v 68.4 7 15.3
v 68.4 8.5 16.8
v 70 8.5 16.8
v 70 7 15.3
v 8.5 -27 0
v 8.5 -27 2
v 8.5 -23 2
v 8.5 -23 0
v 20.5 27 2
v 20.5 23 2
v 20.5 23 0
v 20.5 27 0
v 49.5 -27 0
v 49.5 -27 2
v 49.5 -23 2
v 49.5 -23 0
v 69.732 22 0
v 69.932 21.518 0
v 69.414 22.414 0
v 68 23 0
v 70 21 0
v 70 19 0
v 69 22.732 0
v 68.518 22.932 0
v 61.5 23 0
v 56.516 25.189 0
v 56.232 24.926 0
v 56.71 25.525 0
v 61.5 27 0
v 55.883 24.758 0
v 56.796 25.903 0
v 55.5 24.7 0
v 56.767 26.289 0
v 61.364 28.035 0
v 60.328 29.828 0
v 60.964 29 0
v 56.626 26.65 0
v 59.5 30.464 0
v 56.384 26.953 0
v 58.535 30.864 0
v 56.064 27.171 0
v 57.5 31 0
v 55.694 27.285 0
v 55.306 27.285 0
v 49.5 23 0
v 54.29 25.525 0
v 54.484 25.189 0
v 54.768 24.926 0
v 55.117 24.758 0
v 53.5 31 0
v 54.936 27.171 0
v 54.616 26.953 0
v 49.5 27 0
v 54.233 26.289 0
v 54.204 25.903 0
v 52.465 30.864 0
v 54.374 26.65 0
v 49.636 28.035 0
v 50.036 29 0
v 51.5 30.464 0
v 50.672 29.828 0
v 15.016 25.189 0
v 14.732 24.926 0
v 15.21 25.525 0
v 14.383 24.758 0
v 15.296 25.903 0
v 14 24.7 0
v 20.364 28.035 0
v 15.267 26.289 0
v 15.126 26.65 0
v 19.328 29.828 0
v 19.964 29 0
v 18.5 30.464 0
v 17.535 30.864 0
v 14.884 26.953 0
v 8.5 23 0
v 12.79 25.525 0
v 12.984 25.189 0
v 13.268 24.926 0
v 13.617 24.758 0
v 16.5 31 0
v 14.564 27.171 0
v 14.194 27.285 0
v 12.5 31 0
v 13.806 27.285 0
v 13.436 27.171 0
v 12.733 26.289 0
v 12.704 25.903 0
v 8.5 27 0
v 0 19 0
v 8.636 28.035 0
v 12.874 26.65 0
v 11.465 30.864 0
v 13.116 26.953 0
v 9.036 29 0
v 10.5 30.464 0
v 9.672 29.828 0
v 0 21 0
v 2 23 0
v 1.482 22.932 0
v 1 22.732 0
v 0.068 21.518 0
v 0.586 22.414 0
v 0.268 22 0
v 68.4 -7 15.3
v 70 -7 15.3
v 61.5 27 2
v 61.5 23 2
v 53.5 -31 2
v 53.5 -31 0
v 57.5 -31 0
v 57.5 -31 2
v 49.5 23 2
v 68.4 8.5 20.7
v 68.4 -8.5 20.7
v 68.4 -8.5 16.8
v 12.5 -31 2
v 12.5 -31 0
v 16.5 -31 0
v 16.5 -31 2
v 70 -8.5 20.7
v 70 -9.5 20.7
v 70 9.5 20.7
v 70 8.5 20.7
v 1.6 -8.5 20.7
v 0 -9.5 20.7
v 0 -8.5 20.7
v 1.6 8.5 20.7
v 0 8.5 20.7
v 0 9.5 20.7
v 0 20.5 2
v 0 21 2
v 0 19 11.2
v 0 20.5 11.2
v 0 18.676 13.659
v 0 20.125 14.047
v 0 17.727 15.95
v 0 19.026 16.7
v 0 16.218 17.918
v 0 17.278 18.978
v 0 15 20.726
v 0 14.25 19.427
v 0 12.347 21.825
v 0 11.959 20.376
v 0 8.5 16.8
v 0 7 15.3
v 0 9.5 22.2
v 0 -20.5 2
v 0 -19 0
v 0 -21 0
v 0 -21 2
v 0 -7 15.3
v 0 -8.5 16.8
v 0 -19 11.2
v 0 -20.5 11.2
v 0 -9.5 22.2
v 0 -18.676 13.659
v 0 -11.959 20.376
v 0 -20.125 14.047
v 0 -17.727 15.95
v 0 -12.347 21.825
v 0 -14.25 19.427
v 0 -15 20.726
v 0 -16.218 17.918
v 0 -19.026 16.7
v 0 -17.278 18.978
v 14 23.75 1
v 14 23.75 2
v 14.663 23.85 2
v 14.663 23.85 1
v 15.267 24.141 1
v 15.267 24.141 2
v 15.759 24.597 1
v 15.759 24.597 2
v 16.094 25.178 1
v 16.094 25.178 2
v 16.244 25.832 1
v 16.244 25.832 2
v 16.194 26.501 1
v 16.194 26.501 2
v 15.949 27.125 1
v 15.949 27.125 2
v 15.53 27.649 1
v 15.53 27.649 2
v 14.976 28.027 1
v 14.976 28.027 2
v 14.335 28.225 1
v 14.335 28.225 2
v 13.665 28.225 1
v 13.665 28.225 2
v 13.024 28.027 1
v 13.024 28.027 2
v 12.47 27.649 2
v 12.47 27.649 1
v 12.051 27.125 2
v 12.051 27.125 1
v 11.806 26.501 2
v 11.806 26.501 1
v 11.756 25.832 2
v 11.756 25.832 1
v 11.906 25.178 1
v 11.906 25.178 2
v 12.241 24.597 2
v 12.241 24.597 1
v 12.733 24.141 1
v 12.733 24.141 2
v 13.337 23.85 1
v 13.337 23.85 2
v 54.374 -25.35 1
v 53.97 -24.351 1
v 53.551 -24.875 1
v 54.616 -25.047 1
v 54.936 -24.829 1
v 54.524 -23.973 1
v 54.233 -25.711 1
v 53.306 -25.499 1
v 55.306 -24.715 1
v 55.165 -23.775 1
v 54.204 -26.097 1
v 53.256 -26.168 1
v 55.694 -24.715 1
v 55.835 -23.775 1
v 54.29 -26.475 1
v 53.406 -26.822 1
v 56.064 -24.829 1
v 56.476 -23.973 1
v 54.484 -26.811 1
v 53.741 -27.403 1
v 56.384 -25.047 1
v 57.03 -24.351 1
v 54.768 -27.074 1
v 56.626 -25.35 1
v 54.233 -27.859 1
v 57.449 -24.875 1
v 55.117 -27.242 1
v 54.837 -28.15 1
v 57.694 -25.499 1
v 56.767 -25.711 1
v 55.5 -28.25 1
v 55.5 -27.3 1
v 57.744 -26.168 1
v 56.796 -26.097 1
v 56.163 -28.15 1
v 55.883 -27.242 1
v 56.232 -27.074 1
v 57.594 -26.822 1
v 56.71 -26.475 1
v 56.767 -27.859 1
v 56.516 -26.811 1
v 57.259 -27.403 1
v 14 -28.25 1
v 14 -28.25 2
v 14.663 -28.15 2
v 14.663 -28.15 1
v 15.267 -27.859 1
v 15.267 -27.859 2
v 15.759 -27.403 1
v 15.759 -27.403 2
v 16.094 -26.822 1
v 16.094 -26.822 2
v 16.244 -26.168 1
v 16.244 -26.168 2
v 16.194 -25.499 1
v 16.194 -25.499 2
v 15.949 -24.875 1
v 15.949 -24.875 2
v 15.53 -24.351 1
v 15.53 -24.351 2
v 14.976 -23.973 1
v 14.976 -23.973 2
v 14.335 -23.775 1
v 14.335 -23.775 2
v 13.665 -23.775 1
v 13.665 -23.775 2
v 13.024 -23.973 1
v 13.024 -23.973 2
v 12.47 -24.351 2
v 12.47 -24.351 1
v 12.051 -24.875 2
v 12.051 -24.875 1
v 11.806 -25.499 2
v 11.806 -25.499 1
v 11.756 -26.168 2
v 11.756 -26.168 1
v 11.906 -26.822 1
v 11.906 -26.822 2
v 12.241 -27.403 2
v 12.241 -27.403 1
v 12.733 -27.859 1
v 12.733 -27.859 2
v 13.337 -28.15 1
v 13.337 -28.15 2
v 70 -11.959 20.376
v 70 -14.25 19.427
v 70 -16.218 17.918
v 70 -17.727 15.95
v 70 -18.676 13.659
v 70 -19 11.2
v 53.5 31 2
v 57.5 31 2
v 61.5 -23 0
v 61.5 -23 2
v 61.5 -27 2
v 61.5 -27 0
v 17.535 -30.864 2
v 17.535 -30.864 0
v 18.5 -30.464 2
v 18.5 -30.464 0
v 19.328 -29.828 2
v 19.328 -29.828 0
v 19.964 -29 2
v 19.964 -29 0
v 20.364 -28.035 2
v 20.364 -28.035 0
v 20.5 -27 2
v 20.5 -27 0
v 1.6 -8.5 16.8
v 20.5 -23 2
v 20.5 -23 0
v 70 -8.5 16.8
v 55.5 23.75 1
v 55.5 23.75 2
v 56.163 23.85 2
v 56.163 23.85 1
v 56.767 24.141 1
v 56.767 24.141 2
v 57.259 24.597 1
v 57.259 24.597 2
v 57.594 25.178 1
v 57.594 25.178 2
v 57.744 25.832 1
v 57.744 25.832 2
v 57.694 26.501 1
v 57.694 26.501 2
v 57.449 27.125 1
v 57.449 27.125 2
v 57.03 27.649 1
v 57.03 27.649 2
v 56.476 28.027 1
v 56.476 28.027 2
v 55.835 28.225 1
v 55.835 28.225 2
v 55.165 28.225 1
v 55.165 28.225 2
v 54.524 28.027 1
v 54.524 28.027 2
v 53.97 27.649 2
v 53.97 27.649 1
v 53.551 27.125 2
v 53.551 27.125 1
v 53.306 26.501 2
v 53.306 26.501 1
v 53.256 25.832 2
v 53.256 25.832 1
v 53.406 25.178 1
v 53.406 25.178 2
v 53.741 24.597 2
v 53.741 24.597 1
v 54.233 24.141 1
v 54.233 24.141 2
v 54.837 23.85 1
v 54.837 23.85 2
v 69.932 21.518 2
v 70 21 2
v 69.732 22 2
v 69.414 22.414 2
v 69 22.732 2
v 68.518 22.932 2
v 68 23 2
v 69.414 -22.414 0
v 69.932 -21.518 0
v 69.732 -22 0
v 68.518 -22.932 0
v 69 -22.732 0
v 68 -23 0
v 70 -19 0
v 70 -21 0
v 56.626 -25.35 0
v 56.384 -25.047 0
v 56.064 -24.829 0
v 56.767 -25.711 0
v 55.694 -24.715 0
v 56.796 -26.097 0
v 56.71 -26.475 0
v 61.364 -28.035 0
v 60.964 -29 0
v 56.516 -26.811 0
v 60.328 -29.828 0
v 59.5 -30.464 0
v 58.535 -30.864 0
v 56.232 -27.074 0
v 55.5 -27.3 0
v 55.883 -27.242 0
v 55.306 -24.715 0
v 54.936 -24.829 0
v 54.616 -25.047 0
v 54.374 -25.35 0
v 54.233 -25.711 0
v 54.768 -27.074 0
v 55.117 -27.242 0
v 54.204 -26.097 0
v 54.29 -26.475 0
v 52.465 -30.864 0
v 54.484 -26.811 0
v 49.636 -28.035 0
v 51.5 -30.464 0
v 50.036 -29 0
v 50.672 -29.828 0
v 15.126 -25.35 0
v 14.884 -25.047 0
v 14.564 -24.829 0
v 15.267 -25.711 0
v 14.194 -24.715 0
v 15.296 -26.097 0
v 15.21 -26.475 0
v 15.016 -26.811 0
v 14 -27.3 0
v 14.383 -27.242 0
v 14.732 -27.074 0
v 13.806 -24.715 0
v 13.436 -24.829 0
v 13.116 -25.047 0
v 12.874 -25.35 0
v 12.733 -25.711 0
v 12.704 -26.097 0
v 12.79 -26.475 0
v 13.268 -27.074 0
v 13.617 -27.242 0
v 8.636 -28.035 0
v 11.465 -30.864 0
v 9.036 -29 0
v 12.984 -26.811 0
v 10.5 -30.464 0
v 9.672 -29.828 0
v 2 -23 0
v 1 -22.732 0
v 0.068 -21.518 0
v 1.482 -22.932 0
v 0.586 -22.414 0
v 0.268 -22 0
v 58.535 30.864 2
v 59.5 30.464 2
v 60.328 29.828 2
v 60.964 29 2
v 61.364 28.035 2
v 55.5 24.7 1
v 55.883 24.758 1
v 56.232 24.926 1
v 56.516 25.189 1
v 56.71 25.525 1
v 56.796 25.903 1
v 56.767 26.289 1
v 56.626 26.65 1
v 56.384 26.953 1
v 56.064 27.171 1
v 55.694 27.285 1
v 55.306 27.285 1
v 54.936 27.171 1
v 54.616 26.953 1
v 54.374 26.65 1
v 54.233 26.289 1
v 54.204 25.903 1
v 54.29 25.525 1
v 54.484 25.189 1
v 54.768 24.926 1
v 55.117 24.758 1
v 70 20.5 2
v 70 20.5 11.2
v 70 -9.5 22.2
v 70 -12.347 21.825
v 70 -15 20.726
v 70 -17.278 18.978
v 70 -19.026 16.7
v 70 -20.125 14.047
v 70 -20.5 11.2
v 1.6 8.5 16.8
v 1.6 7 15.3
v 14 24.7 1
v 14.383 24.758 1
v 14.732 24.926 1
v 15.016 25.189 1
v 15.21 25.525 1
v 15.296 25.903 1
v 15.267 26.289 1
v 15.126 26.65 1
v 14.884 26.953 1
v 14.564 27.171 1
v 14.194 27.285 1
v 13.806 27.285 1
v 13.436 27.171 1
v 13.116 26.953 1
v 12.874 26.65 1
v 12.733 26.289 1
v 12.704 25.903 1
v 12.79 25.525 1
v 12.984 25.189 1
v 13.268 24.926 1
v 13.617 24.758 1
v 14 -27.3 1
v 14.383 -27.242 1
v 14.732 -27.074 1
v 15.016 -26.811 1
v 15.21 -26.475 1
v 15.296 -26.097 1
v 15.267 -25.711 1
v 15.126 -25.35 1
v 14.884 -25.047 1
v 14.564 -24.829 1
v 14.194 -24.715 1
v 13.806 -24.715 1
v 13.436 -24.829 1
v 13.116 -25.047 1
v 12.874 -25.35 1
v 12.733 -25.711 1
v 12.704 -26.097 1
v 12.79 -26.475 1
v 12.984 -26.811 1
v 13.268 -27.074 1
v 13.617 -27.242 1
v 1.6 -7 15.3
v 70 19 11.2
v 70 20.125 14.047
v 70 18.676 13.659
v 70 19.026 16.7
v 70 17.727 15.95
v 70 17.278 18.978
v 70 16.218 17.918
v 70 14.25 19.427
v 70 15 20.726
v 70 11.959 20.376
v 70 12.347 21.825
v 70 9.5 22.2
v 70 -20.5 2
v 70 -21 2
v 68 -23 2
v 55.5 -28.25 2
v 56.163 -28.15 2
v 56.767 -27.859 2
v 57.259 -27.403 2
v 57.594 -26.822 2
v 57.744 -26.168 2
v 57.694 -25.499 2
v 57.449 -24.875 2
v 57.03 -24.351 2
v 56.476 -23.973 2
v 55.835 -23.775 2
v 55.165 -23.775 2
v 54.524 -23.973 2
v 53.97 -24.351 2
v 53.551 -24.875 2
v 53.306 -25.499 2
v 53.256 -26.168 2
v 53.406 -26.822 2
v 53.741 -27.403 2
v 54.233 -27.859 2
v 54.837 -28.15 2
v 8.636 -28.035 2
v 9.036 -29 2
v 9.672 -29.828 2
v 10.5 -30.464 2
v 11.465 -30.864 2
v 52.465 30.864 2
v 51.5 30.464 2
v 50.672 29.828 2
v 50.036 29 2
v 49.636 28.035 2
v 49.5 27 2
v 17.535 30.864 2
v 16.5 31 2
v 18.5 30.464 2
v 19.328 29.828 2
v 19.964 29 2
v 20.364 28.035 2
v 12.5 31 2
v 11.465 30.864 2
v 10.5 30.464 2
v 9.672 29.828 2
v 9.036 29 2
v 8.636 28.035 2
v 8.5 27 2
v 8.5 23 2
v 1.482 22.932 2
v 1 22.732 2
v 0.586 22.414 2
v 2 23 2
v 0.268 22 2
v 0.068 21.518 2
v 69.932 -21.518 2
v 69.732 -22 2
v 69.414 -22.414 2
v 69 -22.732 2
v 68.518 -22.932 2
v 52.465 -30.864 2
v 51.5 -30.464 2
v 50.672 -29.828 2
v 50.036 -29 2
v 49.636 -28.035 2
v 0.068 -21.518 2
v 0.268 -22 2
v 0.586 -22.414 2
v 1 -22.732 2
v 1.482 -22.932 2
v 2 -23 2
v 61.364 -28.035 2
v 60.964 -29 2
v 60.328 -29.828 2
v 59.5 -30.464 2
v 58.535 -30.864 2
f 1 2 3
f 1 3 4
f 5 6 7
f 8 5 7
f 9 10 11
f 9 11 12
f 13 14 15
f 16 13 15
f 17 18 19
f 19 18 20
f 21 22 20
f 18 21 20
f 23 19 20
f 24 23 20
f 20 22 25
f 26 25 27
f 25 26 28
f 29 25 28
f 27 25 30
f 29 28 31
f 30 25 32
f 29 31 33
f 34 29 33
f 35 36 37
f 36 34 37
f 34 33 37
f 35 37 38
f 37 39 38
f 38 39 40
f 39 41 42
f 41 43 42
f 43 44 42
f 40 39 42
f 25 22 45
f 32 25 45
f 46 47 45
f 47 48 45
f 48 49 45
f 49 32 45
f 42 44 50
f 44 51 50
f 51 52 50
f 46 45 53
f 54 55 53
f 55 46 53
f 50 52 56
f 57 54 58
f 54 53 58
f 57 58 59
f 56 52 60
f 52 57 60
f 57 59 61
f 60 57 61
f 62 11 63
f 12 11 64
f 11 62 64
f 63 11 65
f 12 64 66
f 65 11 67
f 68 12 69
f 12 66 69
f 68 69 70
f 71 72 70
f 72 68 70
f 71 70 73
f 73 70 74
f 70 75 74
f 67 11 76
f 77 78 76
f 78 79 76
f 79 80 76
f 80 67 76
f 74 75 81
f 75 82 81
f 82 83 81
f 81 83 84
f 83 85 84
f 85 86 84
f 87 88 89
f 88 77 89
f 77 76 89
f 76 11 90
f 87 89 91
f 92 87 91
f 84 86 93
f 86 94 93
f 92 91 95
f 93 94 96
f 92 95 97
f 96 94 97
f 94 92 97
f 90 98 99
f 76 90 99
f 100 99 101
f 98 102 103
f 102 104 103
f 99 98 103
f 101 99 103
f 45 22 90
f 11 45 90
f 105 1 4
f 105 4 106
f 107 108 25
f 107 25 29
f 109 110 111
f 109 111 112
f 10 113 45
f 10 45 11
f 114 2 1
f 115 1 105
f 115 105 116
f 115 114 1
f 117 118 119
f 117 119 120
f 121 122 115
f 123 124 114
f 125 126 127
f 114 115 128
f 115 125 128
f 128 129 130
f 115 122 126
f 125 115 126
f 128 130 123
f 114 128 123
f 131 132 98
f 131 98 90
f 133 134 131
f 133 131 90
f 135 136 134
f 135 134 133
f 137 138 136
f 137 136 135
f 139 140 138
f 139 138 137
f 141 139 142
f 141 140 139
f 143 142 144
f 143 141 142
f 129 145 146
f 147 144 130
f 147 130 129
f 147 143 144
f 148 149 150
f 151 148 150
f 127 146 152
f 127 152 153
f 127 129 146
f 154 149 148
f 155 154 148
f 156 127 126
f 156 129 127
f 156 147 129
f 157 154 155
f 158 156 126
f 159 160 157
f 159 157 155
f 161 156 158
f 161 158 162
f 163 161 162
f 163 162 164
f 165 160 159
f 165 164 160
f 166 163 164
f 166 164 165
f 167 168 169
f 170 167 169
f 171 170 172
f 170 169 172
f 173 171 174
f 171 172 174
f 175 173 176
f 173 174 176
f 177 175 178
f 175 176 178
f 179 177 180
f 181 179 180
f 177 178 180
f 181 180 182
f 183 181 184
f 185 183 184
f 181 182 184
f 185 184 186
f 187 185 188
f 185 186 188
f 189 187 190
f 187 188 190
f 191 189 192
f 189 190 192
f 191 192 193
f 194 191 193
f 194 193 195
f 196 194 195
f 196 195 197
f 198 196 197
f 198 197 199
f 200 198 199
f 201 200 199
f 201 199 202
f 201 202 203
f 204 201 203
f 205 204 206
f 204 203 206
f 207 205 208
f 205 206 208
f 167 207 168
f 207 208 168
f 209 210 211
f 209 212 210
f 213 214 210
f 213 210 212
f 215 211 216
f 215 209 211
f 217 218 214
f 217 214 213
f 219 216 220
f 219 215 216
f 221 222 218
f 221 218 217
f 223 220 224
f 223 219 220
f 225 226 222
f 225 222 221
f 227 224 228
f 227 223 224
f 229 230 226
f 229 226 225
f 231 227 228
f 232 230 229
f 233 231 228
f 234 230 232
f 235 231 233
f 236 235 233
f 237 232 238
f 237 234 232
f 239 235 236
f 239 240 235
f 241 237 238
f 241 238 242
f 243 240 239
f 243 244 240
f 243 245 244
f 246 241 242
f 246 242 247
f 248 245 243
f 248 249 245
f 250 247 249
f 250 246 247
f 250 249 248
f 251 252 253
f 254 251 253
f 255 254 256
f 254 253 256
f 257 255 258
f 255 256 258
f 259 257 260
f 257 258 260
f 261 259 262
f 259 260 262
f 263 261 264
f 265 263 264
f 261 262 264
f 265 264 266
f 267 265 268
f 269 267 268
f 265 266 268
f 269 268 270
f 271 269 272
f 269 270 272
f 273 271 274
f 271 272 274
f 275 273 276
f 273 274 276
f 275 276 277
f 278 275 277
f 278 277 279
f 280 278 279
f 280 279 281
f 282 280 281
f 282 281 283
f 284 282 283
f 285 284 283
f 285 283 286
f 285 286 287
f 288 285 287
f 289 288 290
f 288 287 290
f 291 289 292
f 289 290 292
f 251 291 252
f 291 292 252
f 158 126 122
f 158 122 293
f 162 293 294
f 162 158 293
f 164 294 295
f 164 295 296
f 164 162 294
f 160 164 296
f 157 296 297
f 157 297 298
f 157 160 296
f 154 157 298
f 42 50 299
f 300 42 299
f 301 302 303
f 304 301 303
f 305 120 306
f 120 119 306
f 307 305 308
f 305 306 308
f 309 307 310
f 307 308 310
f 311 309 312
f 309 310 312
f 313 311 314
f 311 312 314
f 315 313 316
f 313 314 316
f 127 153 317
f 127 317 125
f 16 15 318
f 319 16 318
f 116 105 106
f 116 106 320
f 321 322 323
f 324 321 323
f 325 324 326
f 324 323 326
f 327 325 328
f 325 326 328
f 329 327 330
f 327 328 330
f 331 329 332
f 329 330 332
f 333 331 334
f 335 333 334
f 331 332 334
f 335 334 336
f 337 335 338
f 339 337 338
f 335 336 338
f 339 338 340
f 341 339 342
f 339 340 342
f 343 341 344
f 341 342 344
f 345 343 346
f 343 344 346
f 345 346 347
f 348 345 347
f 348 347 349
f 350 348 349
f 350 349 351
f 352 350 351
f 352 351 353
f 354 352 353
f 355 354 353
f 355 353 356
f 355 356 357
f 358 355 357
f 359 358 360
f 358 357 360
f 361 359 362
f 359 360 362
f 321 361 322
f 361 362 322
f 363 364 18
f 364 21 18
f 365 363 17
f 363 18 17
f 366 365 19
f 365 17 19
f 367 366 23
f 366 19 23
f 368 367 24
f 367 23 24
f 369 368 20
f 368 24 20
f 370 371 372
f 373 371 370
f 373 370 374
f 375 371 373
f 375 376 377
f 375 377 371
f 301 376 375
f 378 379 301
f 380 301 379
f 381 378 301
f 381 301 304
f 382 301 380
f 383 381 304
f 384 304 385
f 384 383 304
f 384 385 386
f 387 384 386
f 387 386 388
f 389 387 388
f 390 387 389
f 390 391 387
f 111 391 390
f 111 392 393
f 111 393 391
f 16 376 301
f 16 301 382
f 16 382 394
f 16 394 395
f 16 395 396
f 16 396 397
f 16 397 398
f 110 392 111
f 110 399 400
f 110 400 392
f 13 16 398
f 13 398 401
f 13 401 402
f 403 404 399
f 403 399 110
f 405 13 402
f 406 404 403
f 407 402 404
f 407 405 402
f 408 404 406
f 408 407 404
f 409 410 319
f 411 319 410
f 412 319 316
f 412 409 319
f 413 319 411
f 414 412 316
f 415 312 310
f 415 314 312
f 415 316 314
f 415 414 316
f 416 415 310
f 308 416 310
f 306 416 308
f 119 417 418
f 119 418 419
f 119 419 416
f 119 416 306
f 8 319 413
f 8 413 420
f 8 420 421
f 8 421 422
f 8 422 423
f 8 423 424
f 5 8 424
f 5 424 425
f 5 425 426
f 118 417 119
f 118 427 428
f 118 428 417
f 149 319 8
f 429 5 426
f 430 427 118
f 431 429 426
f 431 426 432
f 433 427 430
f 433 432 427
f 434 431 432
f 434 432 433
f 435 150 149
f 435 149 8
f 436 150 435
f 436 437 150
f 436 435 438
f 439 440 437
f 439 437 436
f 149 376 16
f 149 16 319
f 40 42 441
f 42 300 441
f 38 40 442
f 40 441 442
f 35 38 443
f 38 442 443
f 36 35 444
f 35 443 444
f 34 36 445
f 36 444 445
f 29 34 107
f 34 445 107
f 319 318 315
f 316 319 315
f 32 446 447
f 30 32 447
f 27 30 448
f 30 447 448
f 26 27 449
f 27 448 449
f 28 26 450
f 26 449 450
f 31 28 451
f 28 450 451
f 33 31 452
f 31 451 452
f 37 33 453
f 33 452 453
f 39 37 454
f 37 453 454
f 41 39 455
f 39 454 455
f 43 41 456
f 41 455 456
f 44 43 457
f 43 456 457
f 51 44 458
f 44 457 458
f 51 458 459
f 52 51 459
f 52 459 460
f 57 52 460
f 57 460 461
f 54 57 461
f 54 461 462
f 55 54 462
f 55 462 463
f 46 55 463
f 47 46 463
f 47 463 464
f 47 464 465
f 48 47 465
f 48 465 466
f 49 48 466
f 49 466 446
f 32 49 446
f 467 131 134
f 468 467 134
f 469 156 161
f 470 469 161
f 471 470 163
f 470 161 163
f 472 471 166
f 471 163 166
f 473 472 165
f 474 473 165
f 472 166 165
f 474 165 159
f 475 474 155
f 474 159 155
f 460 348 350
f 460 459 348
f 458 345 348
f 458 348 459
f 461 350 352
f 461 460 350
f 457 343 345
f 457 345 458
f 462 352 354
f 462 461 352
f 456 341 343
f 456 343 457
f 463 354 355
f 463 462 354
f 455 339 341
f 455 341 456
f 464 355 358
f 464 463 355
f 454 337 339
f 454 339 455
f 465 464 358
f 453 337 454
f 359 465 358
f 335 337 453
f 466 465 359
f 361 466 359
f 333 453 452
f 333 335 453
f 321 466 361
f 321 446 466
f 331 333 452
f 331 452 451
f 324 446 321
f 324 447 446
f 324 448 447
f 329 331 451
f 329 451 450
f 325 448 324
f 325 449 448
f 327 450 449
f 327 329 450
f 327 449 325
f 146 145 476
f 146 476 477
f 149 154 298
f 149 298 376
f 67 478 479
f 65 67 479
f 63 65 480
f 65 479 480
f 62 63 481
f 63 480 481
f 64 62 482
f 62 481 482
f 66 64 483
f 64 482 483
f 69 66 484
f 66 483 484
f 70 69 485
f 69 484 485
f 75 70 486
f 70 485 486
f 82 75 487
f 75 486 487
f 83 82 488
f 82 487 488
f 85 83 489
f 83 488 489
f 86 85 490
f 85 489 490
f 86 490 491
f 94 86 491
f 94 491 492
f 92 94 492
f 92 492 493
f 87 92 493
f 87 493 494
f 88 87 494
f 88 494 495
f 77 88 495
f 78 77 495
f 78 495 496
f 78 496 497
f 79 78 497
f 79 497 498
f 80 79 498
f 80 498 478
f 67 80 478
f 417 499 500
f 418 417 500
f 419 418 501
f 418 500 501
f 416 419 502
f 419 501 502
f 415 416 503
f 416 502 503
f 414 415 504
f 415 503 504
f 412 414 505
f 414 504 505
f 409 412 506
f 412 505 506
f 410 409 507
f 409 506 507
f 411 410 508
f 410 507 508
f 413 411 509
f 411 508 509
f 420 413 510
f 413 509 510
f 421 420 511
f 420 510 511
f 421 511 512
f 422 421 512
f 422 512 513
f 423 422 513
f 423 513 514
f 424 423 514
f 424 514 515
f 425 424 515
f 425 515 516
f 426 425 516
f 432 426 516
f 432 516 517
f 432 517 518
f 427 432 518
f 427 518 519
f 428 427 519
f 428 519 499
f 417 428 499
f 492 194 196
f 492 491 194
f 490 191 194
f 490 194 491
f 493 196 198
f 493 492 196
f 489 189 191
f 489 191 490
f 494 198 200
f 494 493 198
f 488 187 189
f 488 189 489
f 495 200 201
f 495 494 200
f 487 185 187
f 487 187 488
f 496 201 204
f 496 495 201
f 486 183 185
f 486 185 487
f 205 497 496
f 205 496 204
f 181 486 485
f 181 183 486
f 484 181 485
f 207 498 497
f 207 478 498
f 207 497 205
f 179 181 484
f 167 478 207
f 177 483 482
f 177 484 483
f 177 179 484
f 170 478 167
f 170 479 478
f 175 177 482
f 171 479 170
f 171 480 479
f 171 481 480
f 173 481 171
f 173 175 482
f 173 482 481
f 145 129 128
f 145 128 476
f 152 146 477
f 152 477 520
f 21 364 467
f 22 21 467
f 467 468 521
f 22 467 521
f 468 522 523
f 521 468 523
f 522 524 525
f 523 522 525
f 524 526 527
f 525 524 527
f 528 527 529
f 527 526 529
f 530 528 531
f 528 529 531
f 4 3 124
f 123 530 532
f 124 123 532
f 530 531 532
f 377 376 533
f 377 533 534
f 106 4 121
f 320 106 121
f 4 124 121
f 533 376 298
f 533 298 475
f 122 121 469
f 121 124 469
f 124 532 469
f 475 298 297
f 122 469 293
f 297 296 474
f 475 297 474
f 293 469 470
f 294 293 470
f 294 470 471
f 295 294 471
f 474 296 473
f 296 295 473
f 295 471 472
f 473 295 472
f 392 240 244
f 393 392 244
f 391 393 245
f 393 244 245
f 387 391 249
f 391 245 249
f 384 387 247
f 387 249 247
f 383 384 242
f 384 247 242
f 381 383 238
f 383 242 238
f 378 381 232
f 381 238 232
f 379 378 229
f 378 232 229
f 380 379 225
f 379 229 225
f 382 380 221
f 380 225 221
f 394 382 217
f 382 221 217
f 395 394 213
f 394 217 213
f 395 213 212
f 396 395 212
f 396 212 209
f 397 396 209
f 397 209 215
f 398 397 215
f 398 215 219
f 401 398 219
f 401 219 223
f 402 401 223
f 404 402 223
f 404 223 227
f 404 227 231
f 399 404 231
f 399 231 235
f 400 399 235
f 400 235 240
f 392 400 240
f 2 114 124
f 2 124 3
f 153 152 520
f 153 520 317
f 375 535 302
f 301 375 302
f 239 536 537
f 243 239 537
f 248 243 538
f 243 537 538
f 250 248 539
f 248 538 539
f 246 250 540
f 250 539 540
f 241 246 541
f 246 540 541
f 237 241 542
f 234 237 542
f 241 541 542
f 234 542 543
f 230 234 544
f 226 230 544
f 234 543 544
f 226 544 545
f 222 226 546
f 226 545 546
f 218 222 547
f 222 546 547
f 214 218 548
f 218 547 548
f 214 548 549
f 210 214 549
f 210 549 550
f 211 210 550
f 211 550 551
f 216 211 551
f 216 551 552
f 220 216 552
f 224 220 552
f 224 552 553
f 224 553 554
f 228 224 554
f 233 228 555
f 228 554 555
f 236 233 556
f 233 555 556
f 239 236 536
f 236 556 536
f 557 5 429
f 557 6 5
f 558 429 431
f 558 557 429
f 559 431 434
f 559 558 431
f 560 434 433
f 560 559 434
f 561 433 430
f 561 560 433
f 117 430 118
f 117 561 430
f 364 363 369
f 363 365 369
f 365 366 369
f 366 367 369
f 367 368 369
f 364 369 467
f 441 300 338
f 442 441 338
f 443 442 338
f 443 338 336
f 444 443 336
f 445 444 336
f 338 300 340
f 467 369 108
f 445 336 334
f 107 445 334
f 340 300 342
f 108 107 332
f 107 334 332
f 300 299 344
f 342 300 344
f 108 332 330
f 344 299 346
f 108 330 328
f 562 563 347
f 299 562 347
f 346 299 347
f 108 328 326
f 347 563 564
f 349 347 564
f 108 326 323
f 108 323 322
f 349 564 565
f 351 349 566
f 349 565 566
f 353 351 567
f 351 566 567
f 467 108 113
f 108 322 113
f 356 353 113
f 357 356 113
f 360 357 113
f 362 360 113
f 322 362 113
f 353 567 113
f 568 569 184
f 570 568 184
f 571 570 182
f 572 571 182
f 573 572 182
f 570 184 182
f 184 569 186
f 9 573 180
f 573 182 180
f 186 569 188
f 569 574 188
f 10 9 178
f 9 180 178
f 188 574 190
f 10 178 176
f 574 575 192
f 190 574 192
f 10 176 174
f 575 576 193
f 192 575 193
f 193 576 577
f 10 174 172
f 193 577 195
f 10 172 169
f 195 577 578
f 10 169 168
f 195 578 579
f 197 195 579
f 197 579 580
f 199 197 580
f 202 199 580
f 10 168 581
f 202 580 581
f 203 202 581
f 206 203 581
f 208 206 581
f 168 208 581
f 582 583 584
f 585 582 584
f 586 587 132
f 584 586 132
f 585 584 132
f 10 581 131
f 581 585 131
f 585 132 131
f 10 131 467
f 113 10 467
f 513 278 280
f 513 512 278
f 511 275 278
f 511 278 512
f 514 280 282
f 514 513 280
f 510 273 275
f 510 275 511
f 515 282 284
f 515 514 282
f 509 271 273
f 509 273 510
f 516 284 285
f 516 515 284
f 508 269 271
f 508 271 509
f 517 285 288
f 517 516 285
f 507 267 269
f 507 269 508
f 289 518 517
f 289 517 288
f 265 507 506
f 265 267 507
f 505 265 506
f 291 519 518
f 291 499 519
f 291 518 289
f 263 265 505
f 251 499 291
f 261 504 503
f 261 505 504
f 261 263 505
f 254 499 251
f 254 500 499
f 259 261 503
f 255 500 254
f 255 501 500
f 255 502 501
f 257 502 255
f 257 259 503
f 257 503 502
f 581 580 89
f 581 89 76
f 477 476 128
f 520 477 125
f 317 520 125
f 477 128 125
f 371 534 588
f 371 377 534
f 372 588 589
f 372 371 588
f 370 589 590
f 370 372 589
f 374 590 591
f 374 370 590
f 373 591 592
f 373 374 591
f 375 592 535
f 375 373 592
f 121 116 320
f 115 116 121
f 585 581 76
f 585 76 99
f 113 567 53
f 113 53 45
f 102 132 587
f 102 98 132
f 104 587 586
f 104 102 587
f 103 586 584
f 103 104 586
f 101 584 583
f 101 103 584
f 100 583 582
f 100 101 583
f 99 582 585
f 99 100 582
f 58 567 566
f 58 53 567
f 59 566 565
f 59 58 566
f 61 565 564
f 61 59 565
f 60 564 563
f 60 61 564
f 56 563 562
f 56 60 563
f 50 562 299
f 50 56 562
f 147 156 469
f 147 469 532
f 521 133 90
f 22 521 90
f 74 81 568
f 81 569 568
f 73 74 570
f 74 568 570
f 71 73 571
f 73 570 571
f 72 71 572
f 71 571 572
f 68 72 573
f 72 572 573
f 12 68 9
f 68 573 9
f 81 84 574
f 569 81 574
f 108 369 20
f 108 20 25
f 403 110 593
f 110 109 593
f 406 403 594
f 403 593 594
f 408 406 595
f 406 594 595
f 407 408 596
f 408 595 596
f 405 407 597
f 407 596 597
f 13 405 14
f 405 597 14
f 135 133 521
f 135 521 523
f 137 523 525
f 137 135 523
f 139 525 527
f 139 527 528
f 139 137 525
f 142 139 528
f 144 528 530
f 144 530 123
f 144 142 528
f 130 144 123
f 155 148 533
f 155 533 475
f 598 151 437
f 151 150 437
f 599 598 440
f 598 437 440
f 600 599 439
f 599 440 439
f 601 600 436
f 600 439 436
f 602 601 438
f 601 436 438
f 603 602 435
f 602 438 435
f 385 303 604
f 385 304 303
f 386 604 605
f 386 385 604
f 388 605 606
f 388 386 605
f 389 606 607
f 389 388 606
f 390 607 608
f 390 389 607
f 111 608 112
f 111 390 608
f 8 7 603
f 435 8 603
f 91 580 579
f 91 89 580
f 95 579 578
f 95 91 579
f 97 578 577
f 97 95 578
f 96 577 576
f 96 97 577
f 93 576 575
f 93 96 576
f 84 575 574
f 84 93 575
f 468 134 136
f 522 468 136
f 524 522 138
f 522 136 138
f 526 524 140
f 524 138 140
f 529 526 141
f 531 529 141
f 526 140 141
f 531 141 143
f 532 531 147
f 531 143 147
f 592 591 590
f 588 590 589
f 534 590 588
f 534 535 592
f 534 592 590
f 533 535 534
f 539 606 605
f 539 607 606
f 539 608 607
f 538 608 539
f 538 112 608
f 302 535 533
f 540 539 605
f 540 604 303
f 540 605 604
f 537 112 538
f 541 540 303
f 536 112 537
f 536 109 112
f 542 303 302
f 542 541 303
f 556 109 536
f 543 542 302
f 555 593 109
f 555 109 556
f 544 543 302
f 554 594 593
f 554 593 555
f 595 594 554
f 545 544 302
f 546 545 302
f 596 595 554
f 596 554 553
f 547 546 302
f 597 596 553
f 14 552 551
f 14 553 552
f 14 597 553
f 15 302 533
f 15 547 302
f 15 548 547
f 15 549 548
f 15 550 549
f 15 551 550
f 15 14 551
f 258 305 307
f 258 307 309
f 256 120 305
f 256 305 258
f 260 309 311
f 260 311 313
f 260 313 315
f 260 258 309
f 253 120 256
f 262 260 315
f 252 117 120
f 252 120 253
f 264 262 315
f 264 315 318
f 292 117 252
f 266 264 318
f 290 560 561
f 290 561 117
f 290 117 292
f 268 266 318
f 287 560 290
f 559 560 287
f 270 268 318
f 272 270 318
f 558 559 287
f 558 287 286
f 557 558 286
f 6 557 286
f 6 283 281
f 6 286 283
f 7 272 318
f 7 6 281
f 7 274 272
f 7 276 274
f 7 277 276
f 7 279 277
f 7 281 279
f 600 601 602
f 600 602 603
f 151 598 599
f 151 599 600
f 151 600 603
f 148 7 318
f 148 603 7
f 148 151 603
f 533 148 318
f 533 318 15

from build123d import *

# Parameters (mm, degrees)
PAD_DEPTH           = 70
POCKET_DEPTH        = 2.001
SKETCH002_R         = 1.3
POCKET001_DEPTH     = 2.001
SKETCH003_R         = 2.25
POCKET002_DEPTH     = 1
PAD001_DEPTH        = 1.6
LINEARPATTERN_COUNT = 2
LINEARPATTERN_PITCH = 68.4
FILLET_R            = 2
FILLET001_R         = 4
FILLET002_R         = 4


with BuildPart() as part:
    # Sketch → Pad (new body)
    with BuildSketch(Plane.YZ):
        with BuildLine():
            ThreePointArc((19, 11.2), (16.217514, 17.917514), (9.5, 20.7))
            Line((-9.5, 20.7), (9.5, 20.7))
            ThreePointArc((-9.5, 20.7), (-16.217514, 17.917514), (-19, 11.2))
            Line((-19, 11.2), (-19, 0))
            Line((-19, 0), (-31, 0))
            Line((-31, 0), (-31, 2))
            Line((-31, 2), (-20.5, 2))
            Line((-20.5, 2), (-20.5, 11.2))
            ThreePointArc((-9.5, 22.2), (-17.278175, 18.978175), (-20.5, 11.2))
            Line((-9.5, 22.2), (9.5, 22.2))
            ThreePointArc((20.5, 11.2), (17.278175, 18.978175), (9.5, 22.2))
            Line((20.5, 2), (20.5, 11.2))
            Line((31, 2), (20.5, 2))
            Line((31, 0), (31, 2))
            Line((19, 0), (31, 0))
            Line((19, 11.2), (19, 0))
        make_face()
    extrude(amount=PAD_DEPTH)

    # Sketch001 (on Face13 of Pad) → Pocket (cut, through all)
    with BuildSketch(Plane(origin=(0, 0, 2), x_dir=(0, -1, 0), z_dir=(0, 0, 1))):
        Polygon((23, 73), (23, 61.5), (35, 61.5), (35, 49.5), (23, 49.5), (23, 20.5), (35, 20.5), (35, 8.5), (23, 8.5), (23, -3), (46, -3), (46, 73), align=None)
        Polygon((-46, 73), (-23, 73), (-23, 61.5), (-35, 61.5), (-35, 49.5), (-23, 49.5), (-23, 20.5), (-35, 20.5), (-35, 8.5), (-23, 8.5), (-23, -3), (-46, -3), align=None)
    extrude(amount=-POCKET_DEPTH, mode=Mode.SUBTRACT)

    # Sketch002 (on Face17 of Pocket) → Pocket001 (cut, through all)
    with BuildSketch(Plane(origin=(0, 0, 2), x_dir=(0, -1, 0), z_dir=(0, 0, 1))):
        with Locations((26, 14)):
            Circle(SKETCH002_R)
        with Locations((-26, 14)):
            Circle(SKETCH002_R)
        with Locations((26, 55.5)):
            Circle(SKETCH002_R)
        with Locations((-26, 55.5)):
            Circle(SKETCH002_R)
    extrude(amount=-POCKET001_DEPTH, mode=Mode.SUBTRACT)

    # Sketch003 (on Face17 of Pocket001) → Pocket002 (cut)
    with BuildSketch(Plane(origin=(0, 0, 2), x_dir=(0, -1, 0), z_dir=(0, 0, 1))):
        with Locations((26, 55.5)):
            Circle(SKETCH003_R)
        with Locations((26, 14)):
            Circle(SKETCH003_R)
        with Locations((-26, 55.5)):
            Circle(SKETCH003_R)
        with Locations((-26, 14)):
            Circle(SKETCH003_R)
    extrude(amount=-POCKET002_DEPTH, mode=Mode.SUBTRACT)

    # Sketch004 → Pad001 (join)
    with BuildSketch(Plane.YZ):
        Polygon((-8.5, 21.3), (8.5, 21.3), (8.5, 16.8), (7, 15.3), (-7, 15.3), (-8.5, 16.8), align=None)
    pad001 = extrude(amount=PAD001_DEPTH)

    # LinearPattern: Pad001 ×2
    with Locations(*[(i * LINEARPATTERN_PITCH, 0, 0) for i in range(1, LINEARPATTERN_COUNT)]):
        add(pad001)

    # Fillet
    fillet_edges = [part.edges().sort_by_distance(p)[0] for p in [
        (70, 23, 1),
        (70, -23, 1),
        (0, -23, 1),
        (0, 23, 1),
    ]]
    fillet(fillet_edges, radius=FILLET_R)

    # Fillet001
    fillet001_edges = [part.edges().sort_by_distance(p)[0] for p in [
        (8.5, -31, 1),
        (20.5, -31, 1),
        (49.5, -31, 1),
        (61.5, -31, 1),
    ]]
    fillet(fillet001_edges, radius=FILLET001_R)

    # Fillet002
    fillet002_edges = [part.edges().sort_by_distance(p)[0] for p in [
        (61.5, 31, 1),
        (49.5, 31, 1),
        (20.5, 31, 1),
        (8.5, 31, 1),
    ]]
    fillet(fillet002_edges, radius=FILLET002_R)


solid = part.part
